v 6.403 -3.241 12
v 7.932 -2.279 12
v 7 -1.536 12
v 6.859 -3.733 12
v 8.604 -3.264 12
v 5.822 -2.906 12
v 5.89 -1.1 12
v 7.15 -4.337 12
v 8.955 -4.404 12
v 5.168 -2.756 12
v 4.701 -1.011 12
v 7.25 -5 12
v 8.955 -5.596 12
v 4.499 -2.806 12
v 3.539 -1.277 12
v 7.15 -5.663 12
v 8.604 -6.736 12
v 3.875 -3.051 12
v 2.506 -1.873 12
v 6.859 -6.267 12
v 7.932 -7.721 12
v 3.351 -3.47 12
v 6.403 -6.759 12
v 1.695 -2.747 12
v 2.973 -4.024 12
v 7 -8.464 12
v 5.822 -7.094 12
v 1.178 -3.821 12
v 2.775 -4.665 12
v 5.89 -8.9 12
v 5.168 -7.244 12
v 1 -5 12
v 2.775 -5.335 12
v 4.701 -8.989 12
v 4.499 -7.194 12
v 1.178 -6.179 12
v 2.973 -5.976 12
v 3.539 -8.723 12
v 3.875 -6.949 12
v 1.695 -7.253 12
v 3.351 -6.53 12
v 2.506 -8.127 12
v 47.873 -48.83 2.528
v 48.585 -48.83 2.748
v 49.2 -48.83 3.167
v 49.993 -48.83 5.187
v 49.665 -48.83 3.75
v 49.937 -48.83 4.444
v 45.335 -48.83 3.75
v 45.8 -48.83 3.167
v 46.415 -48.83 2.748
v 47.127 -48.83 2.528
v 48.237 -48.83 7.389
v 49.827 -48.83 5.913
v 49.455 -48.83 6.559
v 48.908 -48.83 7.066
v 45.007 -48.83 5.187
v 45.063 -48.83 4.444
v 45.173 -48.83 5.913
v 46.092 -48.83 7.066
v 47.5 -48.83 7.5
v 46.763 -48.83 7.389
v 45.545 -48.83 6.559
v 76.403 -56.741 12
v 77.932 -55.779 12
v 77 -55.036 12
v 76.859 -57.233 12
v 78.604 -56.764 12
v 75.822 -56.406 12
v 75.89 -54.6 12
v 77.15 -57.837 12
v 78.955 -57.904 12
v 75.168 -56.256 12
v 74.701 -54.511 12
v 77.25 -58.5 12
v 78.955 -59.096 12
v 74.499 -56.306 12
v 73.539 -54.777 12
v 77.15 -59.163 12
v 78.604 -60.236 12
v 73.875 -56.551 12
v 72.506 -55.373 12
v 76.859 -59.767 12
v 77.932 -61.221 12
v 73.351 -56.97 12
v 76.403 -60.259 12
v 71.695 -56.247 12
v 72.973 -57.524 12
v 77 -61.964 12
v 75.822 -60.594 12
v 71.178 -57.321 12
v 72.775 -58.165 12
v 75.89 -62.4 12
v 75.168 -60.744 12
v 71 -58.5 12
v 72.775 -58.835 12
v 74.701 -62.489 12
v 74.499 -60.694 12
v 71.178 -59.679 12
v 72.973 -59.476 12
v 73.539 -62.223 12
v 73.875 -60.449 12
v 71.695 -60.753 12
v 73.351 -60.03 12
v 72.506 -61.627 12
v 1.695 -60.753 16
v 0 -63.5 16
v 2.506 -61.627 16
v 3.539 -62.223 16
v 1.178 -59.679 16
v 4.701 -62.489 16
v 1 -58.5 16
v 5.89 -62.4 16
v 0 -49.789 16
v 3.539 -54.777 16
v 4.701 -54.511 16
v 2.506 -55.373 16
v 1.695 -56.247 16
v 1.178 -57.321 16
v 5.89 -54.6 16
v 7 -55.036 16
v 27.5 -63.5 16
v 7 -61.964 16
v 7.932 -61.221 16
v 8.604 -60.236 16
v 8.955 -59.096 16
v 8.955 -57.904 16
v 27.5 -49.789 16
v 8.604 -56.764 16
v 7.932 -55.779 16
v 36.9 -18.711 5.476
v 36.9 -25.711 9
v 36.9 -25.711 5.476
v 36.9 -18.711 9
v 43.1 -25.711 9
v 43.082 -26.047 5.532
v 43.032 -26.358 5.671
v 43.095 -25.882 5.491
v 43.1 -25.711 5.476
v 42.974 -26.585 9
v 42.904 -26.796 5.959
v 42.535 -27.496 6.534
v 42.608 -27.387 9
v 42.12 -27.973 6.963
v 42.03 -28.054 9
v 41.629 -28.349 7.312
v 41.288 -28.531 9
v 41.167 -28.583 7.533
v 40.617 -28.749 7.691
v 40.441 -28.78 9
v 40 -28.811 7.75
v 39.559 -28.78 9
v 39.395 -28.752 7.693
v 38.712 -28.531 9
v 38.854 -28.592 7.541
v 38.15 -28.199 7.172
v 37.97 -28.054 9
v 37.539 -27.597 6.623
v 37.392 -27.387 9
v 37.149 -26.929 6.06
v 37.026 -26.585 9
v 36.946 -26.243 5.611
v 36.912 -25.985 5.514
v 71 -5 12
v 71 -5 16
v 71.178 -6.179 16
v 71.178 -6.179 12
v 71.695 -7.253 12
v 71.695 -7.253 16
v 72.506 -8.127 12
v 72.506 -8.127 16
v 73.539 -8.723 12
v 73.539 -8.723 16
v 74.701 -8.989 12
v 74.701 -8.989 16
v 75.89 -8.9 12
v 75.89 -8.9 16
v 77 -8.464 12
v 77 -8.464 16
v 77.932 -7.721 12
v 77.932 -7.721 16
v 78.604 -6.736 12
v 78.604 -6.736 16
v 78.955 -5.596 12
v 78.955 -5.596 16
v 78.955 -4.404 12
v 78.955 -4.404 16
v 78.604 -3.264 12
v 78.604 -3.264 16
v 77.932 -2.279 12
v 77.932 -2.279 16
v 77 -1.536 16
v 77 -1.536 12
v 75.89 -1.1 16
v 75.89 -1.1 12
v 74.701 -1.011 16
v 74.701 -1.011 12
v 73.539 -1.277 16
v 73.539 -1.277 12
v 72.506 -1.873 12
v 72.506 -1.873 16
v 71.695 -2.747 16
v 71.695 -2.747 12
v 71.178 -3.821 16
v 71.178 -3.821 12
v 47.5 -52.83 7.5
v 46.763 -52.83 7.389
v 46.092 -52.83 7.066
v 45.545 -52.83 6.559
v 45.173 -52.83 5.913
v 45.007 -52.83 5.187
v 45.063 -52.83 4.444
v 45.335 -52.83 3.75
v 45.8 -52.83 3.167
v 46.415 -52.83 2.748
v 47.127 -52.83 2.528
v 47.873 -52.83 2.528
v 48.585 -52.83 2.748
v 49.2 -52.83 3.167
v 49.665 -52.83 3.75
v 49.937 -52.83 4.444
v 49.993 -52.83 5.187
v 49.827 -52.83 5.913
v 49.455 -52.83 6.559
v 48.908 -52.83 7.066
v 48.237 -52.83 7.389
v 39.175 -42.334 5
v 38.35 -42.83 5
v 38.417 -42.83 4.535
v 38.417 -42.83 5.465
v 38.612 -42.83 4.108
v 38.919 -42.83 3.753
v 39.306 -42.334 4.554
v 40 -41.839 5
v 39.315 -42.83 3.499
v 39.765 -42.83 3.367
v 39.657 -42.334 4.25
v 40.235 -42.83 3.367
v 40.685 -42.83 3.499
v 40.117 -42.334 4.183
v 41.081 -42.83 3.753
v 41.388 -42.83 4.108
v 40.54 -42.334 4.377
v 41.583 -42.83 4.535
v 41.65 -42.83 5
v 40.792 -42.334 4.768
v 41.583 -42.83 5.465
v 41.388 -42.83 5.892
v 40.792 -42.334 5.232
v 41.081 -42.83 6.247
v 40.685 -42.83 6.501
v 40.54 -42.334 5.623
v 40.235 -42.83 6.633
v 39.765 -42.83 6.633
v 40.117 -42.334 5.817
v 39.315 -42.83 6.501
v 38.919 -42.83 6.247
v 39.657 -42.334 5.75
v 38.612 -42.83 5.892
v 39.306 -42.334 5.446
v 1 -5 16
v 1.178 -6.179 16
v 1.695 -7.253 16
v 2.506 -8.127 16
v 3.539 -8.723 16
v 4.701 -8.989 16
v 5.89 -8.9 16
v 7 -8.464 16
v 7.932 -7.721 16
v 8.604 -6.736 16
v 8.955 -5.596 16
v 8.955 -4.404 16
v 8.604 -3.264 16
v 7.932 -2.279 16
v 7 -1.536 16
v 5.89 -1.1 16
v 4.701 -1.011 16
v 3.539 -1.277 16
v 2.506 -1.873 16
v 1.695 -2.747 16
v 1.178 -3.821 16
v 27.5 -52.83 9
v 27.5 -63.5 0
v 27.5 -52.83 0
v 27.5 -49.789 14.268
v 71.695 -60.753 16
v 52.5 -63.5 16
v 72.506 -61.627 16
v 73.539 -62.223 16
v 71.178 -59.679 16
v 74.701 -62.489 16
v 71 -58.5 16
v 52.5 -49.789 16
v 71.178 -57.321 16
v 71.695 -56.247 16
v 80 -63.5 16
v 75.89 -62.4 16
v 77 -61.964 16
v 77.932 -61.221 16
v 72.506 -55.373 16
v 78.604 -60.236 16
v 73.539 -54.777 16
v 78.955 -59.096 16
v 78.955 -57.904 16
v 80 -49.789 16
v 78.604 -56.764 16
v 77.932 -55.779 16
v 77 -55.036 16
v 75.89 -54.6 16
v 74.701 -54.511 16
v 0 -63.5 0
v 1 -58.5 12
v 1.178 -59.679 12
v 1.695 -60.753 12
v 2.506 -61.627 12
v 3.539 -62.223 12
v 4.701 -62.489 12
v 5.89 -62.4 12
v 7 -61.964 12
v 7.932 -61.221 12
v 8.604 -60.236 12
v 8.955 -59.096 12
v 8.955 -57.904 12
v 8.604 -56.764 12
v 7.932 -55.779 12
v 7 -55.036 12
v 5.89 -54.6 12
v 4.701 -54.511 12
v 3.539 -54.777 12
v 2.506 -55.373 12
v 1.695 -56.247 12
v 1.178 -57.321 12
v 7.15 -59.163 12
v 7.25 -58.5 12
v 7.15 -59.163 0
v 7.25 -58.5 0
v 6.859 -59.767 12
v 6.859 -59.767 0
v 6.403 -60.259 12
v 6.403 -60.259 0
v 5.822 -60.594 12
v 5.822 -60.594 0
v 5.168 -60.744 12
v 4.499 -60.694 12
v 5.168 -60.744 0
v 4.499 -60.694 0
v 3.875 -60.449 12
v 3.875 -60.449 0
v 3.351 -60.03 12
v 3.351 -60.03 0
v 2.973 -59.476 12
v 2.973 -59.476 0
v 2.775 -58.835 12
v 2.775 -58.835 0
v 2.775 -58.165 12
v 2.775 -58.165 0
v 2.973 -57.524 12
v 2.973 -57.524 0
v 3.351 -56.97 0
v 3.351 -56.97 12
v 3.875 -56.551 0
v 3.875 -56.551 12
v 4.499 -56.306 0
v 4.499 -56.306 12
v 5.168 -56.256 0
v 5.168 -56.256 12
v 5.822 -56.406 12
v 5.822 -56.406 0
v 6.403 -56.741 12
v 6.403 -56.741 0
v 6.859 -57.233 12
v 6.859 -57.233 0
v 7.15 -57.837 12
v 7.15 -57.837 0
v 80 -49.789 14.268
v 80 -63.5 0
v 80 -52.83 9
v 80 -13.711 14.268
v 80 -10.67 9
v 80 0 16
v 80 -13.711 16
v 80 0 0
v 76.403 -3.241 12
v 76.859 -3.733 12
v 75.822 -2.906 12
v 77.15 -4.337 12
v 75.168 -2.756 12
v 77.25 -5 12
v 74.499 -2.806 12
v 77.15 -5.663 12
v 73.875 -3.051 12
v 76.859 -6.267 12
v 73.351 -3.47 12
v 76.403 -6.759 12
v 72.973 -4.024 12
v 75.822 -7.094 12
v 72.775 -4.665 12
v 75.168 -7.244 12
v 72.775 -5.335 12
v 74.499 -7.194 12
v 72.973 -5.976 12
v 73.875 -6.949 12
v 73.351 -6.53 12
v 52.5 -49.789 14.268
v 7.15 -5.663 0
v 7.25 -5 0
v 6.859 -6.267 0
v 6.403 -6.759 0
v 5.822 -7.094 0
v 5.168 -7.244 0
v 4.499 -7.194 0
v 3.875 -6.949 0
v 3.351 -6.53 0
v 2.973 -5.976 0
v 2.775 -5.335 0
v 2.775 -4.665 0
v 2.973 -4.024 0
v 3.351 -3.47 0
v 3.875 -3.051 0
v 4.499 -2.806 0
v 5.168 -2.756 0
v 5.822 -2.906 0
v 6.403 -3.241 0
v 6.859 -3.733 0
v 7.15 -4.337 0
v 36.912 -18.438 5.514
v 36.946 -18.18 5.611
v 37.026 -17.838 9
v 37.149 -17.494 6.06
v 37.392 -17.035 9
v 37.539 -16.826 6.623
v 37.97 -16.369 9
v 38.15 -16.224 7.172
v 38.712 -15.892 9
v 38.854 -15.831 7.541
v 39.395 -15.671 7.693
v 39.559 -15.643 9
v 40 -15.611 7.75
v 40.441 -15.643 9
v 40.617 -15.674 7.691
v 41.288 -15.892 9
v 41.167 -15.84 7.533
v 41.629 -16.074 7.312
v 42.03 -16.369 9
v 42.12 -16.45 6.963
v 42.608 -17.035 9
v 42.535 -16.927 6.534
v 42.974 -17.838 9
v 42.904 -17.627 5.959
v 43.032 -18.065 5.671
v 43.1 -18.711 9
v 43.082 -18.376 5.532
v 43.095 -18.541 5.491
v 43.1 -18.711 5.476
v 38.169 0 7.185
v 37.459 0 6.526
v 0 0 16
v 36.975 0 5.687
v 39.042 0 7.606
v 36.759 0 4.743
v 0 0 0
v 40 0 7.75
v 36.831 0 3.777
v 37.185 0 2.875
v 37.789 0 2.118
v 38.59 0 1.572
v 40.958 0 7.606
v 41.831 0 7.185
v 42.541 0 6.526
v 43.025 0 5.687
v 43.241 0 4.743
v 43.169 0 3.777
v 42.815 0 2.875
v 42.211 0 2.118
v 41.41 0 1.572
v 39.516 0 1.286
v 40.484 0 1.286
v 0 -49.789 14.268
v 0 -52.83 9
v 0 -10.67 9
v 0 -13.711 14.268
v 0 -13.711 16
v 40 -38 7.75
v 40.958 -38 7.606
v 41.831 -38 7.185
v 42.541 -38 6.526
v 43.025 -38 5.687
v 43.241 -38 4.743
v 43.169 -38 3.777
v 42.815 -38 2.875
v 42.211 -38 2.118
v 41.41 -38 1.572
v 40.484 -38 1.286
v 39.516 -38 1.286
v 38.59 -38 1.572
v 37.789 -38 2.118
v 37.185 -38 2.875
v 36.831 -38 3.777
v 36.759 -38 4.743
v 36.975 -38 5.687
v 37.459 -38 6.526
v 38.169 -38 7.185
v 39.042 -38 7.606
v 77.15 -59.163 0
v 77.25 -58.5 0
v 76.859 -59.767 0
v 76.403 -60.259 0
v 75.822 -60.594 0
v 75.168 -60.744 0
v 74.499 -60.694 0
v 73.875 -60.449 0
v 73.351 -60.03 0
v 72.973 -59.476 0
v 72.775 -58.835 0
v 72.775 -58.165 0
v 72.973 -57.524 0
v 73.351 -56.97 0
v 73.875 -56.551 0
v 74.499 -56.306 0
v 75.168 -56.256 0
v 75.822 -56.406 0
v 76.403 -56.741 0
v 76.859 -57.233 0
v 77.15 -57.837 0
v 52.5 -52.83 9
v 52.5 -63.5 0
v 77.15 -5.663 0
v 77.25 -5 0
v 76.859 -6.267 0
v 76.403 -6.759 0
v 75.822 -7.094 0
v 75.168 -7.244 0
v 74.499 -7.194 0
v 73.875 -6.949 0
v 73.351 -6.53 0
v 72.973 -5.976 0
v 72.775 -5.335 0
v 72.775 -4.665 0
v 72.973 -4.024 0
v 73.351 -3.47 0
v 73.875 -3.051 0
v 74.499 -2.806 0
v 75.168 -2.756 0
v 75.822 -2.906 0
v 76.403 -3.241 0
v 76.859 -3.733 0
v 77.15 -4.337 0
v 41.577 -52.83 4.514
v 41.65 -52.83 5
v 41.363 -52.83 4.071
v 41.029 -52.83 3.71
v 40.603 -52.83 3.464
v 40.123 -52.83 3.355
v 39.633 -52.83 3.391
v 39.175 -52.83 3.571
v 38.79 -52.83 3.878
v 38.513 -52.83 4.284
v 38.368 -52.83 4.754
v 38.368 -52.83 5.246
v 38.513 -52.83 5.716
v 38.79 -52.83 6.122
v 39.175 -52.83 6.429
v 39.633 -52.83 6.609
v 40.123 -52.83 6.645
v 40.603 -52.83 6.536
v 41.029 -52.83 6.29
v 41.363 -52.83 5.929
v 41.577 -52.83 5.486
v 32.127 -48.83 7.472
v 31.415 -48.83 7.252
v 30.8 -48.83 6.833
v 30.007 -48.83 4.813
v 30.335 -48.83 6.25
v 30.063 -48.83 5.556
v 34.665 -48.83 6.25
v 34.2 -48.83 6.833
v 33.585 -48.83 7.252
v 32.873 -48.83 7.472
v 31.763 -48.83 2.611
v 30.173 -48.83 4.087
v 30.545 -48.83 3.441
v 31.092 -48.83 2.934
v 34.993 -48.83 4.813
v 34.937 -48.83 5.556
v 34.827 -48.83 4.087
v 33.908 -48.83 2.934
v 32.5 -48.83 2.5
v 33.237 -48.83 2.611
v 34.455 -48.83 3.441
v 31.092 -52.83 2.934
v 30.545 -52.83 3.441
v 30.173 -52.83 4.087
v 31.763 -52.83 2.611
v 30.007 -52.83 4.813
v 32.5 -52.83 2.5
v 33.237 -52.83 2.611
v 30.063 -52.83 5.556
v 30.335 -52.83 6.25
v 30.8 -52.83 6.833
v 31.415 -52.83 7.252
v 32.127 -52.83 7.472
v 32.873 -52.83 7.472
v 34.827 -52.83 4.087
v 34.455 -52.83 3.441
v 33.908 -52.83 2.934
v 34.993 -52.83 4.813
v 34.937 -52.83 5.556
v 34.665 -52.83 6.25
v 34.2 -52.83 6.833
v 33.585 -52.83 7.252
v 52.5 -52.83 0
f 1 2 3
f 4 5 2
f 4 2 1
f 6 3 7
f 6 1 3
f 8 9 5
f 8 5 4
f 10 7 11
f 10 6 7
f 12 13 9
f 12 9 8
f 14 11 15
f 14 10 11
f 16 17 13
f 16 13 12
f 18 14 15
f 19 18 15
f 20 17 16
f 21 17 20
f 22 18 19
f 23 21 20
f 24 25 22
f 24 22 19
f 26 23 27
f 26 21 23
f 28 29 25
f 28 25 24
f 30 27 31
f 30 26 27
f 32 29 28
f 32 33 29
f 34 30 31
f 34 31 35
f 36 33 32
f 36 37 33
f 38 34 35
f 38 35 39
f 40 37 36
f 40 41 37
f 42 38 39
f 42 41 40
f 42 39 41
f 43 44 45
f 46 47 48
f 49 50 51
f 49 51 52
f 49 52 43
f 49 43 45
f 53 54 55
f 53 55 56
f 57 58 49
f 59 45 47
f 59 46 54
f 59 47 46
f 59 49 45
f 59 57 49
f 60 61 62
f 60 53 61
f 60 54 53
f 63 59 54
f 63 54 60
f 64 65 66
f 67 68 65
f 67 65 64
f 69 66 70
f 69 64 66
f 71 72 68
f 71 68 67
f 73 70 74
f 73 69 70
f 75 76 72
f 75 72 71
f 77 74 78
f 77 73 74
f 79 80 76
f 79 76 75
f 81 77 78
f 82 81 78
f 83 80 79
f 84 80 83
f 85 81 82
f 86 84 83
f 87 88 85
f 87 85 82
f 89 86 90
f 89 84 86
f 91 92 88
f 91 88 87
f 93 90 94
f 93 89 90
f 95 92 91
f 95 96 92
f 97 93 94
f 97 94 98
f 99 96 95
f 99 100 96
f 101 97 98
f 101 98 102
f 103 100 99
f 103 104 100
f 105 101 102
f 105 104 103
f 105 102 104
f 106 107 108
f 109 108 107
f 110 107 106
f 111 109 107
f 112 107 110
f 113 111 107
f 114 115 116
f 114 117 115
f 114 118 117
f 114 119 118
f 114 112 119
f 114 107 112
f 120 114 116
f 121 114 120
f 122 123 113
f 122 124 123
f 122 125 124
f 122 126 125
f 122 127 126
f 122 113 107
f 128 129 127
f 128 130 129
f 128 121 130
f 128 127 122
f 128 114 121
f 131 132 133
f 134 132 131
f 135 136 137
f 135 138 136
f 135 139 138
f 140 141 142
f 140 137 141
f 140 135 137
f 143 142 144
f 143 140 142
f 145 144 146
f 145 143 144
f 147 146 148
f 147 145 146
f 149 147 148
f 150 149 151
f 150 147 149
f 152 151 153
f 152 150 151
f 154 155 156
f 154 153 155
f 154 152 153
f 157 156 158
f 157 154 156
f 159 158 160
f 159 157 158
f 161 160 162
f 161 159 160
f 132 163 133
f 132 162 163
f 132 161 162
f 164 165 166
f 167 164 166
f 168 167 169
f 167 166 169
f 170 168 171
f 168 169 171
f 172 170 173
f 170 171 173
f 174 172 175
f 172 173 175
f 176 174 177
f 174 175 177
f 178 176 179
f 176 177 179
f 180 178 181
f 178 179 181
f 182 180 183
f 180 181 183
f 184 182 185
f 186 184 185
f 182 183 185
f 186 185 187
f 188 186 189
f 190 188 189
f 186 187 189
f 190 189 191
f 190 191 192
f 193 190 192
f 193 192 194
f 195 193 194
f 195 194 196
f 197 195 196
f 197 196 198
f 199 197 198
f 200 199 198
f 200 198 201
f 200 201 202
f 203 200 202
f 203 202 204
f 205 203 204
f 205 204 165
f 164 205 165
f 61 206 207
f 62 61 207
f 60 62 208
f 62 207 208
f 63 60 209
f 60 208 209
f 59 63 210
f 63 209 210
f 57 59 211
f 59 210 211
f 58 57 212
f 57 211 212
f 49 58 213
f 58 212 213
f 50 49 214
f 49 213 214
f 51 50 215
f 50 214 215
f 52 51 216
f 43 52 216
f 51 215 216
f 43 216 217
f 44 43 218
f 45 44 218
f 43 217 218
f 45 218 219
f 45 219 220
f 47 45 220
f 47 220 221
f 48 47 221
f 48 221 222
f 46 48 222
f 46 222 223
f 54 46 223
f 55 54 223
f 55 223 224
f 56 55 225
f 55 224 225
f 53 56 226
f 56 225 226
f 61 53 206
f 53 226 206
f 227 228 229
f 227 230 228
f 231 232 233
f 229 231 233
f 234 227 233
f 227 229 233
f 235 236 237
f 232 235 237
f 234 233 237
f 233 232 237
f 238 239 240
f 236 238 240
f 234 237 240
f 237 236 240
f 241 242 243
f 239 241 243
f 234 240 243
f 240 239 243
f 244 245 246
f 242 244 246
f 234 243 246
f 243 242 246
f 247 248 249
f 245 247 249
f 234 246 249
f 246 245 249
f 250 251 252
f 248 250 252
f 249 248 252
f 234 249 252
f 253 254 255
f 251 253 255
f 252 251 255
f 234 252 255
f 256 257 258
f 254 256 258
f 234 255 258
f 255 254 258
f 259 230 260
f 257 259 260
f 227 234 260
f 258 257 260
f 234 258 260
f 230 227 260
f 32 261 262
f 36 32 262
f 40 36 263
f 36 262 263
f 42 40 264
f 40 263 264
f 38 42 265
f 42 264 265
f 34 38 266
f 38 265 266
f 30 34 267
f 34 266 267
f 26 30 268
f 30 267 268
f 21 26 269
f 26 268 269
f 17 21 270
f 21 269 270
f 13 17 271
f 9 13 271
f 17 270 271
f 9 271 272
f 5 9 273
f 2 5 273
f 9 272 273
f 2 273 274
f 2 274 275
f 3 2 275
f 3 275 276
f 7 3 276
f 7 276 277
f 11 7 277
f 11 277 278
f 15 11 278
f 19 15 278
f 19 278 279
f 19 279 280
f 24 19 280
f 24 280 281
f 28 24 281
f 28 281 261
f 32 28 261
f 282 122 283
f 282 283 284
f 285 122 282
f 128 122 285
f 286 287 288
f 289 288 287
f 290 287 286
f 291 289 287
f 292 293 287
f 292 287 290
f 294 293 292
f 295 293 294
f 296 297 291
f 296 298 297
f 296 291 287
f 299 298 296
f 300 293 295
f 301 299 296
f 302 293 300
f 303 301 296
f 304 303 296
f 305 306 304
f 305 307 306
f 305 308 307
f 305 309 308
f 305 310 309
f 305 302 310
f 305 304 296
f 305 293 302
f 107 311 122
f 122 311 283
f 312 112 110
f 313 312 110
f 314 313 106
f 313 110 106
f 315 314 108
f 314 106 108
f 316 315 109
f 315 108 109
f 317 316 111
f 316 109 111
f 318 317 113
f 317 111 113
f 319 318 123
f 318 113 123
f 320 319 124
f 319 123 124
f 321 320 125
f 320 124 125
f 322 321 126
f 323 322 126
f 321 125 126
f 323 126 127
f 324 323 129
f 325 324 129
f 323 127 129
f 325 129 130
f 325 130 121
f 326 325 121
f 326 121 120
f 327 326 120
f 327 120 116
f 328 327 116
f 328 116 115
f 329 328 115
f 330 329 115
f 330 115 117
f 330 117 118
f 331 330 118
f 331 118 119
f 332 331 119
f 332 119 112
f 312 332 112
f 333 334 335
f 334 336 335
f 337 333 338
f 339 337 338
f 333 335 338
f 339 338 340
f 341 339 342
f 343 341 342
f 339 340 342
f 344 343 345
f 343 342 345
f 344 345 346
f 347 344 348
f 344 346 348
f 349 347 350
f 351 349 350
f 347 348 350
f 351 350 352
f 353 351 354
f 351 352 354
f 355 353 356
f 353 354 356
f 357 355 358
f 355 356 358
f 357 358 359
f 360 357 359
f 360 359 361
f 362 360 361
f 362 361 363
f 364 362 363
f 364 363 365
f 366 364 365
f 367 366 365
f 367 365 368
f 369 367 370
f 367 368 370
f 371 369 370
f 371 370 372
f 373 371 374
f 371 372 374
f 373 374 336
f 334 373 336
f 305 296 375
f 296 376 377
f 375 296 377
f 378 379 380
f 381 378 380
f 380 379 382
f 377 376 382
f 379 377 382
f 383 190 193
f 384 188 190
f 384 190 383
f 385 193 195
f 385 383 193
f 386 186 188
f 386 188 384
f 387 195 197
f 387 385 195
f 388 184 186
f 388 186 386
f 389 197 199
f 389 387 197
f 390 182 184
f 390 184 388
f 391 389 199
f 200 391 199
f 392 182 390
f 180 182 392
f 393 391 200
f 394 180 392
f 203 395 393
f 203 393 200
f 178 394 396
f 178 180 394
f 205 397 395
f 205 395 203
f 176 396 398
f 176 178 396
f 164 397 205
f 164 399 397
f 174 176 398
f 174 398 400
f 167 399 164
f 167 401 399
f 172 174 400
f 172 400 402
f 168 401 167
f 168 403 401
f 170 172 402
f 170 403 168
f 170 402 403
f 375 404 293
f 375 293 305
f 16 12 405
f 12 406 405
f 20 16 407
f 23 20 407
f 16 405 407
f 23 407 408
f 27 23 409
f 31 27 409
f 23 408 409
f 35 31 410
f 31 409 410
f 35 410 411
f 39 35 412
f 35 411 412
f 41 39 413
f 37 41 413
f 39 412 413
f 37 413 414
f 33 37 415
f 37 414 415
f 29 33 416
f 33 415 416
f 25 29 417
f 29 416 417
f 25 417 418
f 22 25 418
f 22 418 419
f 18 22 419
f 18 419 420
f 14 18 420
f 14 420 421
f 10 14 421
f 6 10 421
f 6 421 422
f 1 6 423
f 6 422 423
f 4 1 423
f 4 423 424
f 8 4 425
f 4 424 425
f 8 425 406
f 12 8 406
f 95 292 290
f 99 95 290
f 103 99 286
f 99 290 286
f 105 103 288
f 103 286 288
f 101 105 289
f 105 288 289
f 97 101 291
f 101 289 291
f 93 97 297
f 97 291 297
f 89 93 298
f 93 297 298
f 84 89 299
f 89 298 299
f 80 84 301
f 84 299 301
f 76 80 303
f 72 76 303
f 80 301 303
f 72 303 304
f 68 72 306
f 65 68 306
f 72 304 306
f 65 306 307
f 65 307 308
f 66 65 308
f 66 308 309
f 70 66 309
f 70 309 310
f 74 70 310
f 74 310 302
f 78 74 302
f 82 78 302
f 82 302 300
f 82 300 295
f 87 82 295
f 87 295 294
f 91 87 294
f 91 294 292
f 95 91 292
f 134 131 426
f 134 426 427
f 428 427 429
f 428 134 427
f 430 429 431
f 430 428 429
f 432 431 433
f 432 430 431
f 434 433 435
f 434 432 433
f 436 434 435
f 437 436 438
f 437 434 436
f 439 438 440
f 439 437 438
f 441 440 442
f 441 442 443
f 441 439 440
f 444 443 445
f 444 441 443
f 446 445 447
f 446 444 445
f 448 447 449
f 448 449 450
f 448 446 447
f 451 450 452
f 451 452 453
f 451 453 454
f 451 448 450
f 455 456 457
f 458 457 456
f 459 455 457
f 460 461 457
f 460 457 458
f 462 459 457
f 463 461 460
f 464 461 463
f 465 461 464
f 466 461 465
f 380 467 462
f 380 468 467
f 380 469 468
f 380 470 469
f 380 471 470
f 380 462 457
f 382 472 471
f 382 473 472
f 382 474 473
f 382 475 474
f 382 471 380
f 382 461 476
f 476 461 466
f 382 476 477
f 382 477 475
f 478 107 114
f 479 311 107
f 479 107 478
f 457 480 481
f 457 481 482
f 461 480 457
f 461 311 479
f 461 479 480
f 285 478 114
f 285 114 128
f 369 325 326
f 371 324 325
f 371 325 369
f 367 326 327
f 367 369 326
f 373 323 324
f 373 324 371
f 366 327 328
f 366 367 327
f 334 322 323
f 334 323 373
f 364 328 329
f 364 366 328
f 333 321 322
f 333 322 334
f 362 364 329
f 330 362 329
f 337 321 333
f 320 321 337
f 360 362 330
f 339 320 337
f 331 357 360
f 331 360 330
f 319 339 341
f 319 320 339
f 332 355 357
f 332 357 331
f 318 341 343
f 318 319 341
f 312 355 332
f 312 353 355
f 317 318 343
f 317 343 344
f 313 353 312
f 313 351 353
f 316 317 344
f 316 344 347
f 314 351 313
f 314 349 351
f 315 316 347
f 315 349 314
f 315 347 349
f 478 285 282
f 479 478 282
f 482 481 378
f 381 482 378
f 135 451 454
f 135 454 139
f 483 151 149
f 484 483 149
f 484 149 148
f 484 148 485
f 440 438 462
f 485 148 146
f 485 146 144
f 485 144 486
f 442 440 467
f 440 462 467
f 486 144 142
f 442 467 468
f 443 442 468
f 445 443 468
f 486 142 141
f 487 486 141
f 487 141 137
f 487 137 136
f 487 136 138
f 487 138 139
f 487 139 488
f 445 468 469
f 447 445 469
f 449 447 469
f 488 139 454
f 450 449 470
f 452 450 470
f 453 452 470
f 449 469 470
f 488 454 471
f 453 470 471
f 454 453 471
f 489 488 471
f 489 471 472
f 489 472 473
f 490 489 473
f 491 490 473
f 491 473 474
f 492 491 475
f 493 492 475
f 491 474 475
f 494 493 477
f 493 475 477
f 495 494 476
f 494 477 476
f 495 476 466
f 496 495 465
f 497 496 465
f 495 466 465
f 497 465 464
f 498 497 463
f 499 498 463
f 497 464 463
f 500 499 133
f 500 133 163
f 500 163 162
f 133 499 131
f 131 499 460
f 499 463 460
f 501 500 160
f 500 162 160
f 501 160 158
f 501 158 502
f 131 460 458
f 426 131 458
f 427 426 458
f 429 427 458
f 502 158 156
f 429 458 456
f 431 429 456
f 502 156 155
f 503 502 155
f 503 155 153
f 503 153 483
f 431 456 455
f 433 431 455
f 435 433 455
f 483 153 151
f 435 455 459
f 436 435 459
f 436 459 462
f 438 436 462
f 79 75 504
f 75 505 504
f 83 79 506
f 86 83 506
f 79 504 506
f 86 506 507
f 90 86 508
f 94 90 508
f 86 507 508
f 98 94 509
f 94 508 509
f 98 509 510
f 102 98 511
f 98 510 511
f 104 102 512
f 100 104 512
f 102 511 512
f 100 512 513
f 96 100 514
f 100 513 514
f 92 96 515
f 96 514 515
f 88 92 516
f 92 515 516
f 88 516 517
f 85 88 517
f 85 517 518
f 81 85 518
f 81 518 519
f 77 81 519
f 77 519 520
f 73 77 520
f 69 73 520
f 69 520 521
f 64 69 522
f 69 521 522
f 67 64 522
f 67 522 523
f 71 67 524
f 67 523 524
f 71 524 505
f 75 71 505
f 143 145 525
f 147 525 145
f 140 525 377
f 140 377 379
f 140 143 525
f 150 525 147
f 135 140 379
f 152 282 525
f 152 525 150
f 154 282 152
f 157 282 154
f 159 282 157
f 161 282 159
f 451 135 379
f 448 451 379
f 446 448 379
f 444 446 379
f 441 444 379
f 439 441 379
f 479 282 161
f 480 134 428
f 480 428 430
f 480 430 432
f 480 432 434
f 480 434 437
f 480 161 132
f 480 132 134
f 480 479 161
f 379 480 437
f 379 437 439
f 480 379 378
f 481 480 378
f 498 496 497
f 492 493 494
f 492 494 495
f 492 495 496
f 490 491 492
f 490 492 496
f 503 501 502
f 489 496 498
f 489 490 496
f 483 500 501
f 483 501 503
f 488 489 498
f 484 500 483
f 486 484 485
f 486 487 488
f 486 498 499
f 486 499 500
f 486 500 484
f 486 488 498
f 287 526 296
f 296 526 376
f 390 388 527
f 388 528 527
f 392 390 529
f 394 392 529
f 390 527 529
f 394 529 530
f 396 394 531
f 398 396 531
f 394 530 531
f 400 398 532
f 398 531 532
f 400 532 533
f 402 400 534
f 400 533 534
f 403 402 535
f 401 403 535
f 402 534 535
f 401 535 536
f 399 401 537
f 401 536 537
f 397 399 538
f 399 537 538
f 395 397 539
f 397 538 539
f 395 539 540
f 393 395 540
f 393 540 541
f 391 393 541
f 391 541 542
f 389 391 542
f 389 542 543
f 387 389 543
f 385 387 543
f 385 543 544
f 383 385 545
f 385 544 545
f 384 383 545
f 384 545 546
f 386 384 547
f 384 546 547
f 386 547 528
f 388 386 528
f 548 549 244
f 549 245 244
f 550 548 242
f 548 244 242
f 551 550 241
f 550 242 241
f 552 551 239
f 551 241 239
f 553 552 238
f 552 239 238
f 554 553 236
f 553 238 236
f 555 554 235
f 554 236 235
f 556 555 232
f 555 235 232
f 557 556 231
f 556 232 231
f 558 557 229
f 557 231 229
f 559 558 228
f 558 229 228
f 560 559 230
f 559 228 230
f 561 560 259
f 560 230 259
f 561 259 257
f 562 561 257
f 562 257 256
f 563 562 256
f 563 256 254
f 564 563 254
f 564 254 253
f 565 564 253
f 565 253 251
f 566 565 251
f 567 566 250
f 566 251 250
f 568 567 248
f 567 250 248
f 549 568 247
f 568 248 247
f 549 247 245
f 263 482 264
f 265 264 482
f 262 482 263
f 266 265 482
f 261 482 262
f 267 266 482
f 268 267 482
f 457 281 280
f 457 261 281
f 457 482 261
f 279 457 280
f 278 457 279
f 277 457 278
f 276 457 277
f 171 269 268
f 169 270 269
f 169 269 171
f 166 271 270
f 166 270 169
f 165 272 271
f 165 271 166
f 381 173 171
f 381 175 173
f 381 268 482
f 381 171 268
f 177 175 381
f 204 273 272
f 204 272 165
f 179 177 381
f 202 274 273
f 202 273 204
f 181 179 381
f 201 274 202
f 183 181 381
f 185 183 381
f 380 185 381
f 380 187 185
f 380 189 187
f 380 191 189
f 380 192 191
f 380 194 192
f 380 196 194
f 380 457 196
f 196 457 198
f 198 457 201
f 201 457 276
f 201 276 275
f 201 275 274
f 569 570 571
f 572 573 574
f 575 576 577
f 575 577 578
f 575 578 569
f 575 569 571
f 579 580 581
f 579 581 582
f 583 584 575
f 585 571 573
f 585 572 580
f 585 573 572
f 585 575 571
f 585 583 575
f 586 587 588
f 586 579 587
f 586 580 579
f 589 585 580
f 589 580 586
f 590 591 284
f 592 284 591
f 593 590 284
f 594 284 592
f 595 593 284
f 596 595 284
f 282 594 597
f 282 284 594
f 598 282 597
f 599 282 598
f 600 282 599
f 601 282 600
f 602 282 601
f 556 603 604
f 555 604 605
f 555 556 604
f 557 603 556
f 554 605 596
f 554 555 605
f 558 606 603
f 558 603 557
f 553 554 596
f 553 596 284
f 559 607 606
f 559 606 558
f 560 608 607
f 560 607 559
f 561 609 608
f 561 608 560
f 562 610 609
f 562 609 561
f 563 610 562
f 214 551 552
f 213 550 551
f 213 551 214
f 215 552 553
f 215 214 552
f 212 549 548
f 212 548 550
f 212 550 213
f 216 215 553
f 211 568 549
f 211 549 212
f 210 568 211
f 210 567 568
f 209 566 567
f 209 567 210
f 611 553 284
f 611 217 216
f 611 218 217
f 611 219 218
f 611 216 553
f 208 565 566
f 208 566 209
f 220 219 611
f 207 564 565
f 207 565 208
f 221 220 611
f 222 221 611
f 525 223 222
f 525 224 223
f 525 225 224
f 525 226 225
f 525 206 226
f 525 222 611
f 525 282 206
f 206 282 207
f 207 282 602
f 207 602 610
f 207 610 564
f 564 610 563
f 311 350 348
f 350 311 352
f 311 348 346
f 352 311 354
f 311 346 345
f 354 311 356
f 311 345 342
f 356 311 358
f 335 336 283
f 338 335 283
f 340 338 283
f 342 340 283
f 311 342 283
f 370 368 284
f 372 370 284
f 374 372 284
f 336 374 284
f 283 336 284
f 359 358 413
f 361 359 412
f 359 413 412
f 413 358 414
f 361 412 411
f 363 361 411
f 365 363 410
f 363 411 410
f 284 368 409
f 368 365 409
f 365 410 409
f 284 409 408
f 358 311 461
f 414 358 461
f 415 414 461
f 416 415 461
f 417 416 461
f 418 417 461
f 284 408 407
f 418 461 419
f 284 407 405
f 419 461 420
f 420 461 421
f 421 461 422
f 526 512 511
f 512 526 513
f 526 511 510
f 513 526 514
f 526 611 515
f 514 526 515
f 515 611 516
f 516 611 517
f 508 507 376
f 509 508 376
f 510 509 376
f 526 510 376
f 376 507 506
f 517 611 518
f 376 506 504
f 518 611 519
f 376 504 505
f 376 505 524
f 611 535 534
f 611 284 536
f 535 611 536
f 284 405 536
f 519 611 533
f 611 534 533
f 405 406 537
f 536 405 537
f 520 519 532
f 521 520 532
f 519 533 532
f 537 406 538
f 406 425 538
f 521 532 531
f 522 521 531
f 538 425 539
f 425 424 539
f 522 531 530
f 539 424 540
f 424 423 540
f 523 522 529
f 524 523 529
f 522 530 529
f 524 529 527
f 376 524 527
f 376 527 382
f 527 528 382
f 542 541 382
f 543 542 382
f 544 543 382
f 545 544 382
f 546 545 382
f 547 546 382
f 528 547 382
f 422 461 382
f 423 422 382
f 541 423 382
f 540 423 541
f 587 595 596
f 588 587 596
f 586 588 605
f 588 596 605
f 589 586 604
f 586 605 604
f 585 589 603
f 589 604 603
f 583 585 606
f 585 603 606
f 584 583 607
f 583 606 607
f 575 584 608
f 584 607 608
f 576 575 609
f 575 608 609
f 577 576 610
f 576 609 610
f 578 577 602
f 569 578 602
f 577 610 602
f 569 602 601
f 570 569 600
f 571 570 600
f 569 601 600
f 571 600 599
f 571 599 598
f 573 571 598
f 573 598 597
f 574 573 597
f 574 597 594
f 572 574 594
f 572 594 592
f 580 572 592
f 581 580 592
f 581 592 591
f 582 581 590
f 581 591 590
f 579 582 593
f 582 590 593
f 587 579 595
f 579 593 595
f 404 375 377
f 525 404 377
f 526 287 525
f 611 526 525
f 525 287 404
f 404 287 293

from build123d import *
from OCP.BRepFilletAPI import BRepFilletAPI_MakeChamfer

# Parameters (mm, degrees)
SKETCH_1_W                  = 80
SKETCH_1_H                  = 63.5
EXTRUDE_1_DEPTH             = 16
CUT_EXTRUDE_1_DEPTH         = 104.383992958
SKETCH_15_W                 = 25
SKETCH_15_H                 = 14.711451884
CUT_EXTRUDE_4_DEPTH         = 7
SKETCH_16_W                 = 25
SKETCH_16_H                 = 10.67
CUT_EXTRUDE_5_DEPTH         = 9
SKETCH_17_R                 = 2.5
CUT_EXTRUDE_6_DEPTH         = 4
M4X0_72_D                   = 3.3
M4X0_72_DEPTH               = 10
M4X0_72_TIP                 = 0.991420021
CUT_EXTRUDE_7_DEPTH         = 4
SKETCH_26_R                 = 3.25
CUT_EXTRUDE_8_DEPTH         = 38
HOLE_WIZARD_M41_D           = 4.5
HOLE_WIZARD_M41_CBORE_D     = 8
HOLE_WIZARD_M41_CBORE_DEPTH = 4
CHAMFER_2_SIZE              = 1
CHAMFER_2_SIZE2             = 2


with BuildPart() as part:
    # Эскиз1 → Бобышка-Вытянуть1 (new body)
    with BuildSketch(Plane.XY):
        with Locations((40, -31.75)):
            Rectangle(SKETCH_1_W, SKETCH_1_H)
    extrude(amount=EXTRUDE_1_DEPTH)

    # Эскиз2 → Вырез-Вытянуть1 (cut, through all)
    with BuildSketch(Plane.ZY):
        Polygon((9, -10.67), (16, -14.711451884), (16, -48.788548116), (9, -52.83), align=None)
    extrude(amount=-CUT_EXTRUDE_1_DEPTH, mode=Mode.SUBTRACT)

    # Эскиз15 → Вырез-Вытянуть4 (cut)
    with BuildSketch(Plane.XY.offset(16)):
        with Locations((40, -56.144274058)):
            Rectangle(SKETCH_15_W, SKETCH_15_H)
    extrude(amount=-CUT_EXTRUDE_4_DEPTH, mode=Mode.SUBTRACT)

    # Эскиз16 → Вырез-Вытянуть5 (cut)
    with BuildSketch(Plane.XY.offset(9)):
        with Locations((40, -58.165)):
            Rectangle(SKETCH_16_W, SKETCH_16_H)
    extrude(amount=-CUT_EXTRUDE_5_DEPTH, mode=Mode.SUBTRACT)

    # Эскиз17 → Вырез-Вытянуть6 (cut)
    with BuildSketch(Plane.XZ.offset(52.83)):
        with Locations(Location((32.5, 5, 0), (0, 0, 270))):
            Circle(SKETCH_17_R)
        with Locations(Location((47.5, 5, 0), (0, 0, 90))):
            Circle(SKETCH_17_R)
    extrude(amount=-CUT_EXTRUDE_6_DEPTH, mode=Mode.SUBTRACT)

    # Отверстие обработанное метчиком M4x0.72
    with Locations(Plane(origin=(0, -52.83, 0), x_dir=(-1, 0, 0), z_dir=(0, -1, 0))):
        with Locations((-40, -5)):
            Hole(M4X0_72_D / 2, depth=M4X0_72_DEPTH)
            with Locations((0, 0, -(M4X0_72_DEPTH + M4X0_72_TIP / 2))):  # 118° drill point
                Cone(0, M4X0_72_D / 2, M4X0_72_TIP, mode=Mode.SUBTRACT)

    # Эскиз25 → Вырез-Вытянуть7 (cut)
    with BuildSketch(Plane.XY.offset(9)):
        with BuildLine():
            Line((43.1, -18.711451884), (43.1, -25.711451884))
            ThreePointArc((43.1, -25.711451884), (40, -28.811451884), (36.9, -25.711451884))
            Line((36.9, -25.711451884), (36.9, -18.711451884))
            ThreePointArc((36.9, -18.711451884), (40, -15.611451884), (43.1, -18.711451884))
        make_face()
    extrude(amount=-CUT_EXTRUDE_7_DEPTH, mode=Mode.SUBTRACT)

    # Эскиз26 → Вырез-Вытянуть8 (cut)
    with BuildSketch(Plane(origin=(0, 0, 0), x_dir=(1, 0, 0), z_dir=(0, 1, 0))):
        with Locations(Location((40, -4.5, 0), (0, 0, 270))):
            Circle(SKETCH_26_R)
    extrude(amount=-CUT_EXTRUDE_8_DEPTH, mode=Mode.SUBTRACT)

    # Цековка для винта с внутренним шестигранником M41 (through all)
    with Locations(Plane(origin=(30.759227947, 26.793365177, 16), x_dir=(-1, 0, 0), z_dir=(0, 0, 1))):
        with Locations((-44.240772053, 31.793365177), (-44.240772053, 85.293365177), (25.759227947, 85.293365177), (25.759227947, 31.793365177)):
            CounterBoreHole(HOLE_WIZARD_M41_D / 2, HOLE_WIZARD_M41_CBORE_D / 2, HOLE_WIZARD_M41_CBORE_DEPTH)

    # Фаска2: one chamfer whose edges measure the first distance from different faces: ONE call of the kernel's chamfer builder (chamfer() names one face for all edges)
    chamfer_2_edges_1 = [part.edges().sort_by_distance(p)[0] for p in [
        (40, -14.711451884, 16),
    ]]
    chamfer_2_side_1 = [part.faces().sort_by_distance(p)[0] for p in [
        (40, -7.575743279, 16),
    ]]
    chamfer_2_edges_2 = [part.edges().sort_by_distance(p)[0] for p in [
        (66.25, -48.788548116, 16),
    ]]
    chamfer_2_side_2 = [part.faces().sort_by_distance(p)[0] for p in [
        (65.008612302, -55.810060435, 16),
    ]]
    chamfer_2_edges_3 = [part.edges().sort_by_distance(p)[0] for p in [
        (13.75, -48.788548116, 16),
    ]]
    chamfer_2_side_3 = [part.faces().sort_by_distance(p)[0] for p in [
        (14.991387698, -55.810060435, 16),
    ]]
    chamfer_2 = BRepFilletAPI_MakeChamfer(part.part.solid().wrapped)
    for e in chamfer_2_edges_1:
        chamfer_2.Add(CHAMFER_2_SIZE, CHAMFER_2_SIZE2, e.wrapped, chamfer_2_side_1[0].wrapped)  # the first distance lies on this face
    for e in chamfer_2_edges_2:
        chamfer_2.Add(CHAMFER_2_SIZE, CHAMFER_2_SIZE2, e.wrapped, chamfer_2_side_2[0].wrapped)  # the first distance lies on this face
    for e in chamfer_2_edges_3:
        chamfer_2.Add(CHAMFER_2_SIZE, CHAMFER_2_SIZE2, e.wrapped, chamfer_2_side_3[0].wrapped)  # the first distance lies on this face
    add(Compound.cast(chamfer_2.Shape()), mode=Mode.REPLACE)


solid = part.part
